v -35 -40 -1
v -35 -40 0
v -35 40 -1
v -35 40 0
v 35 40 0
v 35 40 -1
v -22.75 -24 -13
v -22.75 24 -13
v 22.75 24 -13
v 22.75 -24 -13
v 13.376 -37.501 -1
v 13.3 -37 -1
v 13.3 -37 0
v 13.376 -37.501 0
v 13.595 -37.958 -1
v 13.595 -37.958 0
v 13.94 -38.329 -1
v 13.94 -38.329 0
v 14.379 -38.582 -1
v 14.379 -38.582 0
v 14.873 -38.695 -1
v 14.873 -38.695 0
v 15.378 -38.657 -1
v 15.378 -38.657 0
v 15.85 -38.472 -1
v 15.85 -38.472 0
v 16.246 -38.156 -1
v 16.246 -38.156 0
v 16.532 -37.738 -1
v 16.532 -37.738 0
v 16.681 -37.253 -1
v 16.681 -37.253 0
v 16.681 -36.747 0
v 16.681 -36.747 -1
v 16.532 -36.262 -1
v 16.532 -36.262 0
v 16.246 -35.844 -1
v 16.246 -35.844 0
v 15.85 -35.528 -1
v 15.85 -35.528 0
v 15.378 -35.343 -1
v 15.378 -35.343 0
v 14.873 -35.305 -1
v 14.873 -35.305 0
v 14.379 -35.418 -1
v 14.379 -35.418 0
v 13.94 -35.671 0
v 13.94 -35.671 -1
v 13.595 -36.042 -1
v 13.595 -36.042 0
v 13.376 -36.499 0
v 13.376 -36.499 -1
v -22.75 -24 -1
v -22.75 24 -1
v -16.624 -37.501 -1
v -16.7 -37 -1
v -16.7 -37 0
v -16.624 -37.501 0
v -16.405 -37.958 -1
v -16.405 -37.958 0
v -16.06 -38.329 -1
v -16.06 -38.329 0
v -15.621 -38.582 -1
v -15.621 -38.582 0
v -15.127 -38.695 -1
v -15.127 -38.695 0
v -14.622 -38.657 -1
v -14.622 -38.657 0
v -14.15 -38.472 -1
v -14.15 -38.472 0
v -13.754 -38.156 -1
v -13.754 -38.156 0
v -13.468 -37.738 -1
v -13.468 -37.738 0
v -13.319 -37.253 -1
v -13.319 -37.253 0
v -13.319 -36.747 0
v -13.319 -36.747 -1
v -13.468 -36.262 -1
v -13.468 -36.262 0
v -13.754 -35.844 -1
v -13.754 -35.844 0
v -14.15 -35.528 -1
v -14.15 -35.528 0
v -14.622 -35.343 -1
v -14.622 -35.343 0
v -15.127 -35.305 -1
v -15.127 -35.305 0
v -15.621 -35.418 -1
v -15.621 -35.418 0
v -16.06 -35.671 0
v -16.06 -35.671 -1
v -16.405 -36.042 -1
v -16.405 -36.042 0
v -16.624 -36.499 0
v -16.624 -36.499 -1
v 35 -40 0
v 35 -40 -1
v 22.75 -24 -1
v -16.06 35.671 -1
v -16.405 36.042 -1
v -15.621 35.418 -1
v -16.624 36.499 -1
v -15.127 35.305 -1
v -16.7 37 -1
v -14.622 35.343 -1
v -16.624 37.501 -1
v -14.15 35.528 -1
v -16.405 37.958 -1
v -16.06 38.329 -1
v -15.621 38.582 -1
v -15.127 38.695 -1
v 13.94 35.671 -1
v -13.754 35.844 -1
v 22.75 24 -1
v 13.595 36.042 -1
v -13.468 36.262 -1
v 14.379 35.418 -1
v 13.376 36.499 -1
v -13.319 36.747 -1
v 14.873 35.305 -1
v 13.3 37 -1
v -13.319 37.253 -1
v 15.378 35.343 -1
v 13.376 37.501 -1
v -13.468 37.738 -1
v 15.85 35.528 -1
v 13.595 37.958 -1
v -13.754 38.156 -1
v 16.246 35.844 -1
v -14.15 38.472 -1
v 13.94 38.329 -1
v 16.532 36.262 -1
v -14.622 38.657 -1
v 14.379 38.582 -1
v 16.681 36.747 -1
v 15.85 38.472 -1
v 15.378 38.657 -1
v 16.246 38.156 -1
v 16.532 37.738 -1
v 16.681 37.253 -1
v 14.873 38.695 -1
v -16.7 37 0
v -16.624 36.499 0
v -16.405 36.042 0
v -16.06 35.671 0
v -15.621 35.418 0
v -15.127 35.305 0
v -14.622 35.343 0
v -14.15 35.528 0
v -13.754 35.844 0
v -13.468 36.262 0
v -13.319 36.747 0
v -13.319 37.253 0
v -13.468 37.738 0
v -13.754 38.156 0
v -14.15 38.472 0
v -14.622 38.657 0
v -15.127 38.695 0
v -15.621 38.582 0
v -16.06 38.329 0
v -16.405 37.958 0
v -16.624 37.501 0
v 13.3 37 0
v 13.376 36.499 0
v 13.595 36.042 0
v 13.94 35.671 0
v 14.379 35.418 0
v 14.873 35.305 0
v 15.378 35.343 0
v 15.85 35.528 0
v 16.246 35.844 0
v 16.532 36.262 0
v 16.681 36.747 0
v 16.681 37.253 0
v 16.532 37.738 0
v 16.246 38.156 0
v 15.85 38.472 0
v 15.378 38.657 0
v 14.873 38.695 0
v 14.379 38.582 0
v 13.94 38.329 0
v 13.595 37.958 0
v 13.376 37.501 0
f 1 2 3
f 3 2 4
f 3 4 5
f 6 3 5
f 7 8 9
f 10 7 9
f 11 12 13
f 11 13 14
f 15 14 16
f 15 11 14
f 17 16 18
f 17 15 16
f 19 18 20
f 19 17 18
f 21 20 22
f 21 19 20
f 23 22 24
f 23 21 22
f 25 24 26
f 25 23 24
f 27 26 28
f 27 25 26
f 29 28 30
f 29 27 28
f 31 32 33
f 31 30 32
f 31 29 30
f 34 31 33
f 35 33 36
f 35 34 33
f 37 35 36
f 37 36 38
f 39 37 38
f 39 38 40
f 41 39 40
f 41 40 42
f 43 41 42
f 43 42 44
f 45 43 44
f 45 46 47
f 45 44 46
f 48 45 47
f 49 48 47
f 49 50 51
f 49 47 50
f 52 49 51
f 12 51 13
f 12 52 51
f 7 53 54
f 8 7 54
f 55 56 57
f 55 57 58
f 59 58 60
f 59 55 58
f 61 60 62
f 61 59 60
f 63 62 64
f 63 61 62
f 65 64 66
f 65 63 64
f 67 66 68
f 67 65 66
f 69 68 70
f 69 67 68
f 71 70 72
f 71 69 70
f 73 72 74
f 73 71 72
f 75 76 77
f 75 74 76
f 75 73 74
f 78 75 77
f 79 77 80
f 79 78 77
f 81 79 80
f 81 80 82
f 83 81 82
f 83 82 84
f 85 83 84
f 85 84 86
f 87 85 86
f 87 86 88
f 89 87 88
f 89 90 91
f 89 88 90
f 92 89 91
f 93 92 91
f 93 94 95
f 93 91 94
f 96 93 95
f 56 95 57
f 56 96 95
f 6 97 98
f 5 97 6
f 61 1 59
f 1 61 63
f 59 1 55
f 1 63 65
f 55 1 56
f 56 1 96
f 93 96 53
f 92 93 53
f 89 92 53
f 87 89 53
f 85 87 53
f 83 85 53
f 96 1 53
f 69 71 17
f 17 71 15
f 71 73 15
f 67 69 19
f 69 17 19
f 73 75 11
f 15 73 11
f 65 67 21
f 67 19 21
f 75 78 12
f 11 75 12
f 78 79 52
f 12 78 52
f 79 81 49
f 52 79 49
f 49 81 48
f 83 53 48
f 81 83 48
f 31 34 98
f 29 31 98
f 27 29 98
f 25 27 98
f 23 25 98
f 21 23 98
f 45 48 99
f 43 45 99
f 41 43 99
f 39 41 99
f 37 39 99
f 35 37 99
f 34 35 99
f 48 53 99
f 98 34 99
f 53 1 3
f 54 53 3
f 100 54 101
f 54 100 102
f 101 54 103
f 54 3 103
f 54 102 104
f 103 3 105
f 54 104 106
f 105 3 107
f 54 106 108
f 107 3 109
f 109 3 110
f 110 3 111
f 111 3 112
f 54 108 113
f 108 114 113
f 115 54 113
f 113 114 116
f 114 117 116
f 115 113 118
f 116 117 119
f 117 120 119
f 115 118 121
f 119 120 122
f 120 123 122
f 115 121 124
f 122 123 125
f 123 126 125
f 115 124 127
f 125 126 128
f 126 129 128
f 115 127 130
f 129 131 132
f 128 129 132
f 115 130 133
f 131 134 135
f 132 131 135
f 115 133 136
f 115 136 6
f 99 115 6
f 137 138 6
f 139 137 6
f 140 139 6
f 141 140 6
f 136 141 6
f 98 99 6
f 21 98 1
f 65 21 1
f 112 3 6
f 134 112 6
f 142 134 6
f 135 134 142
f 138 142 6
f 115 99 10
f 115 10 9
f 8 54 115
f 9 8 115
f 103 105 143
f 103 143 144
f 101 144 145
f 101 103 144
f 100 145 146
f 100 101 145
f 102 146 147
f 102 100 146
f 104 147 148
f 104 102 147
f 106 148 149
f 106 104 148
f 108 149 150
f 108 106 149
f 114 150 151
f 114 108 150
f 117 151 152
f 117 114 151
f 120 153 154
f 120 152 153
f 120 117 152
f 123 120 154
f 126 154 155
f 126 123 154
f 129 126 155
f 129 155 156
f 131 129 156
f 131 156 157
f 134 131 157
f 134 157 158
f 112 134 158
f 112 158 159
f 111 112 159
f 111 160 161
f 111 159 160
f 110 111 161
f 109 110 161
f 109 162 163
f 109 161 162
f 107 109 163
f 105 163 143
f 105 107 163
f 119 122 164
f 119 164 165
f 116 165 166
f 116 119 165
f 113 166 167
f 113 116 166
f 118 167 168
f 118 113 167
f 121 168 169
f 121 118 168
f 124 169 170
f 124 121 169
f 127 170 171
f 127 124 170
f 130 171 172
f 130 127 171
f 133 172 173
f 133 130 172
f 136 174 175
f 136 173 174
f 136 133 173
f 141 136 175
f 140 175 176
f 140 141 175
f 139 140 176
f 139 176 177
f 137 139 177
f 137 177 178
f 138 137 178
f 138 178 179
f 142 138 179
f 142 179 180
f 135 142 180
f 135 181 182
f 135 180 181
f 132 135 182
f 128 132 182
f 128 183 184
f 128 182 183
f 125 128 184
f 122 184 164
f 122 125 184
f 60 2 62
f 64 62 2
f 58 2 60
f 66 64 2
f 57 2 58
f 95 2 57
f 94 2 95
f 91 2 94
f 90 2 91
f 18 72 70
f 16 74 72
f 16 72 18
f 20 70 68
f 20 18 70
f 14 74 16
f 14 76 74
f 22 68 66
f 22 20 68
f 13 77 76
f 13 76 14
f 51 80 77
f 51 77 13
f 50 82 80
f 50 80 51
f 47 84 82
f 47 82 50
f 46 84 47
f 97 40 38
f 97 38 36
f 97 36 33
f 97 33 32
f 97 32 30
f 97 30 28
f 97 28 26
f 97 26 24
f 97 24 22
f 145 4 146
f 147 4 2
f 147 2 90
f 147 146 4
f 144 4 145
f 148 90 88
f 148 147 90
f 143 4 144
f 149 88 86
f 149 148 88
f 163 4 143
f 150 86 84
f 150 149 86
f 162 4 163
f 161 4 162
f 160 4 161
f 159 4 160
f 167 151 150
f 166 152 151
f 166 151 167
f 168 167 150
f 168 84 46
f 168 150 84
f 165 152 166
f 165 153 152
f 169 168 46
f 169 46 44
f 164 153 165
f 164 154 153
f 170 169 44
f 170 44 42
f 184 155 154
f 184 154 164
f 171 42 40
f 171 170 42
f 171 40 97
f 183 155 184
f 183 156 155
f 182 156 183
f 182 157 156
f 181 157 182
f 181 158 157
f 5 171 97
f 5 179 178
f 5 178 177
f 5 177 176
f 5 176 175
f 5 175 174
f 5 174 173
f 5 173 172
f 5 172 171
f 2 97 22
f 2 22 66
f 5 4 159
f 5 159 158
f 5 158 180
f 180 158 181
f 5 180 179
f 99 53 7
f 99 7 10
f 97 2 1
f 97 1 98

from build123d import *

# Parameters (mm, degrees)
SKETCH1_W                   = 70
SKETCH1_H                   = 80
BOSS_EXTRUDE1_DEPTH         = 1
SKETCH2_W                   = 45.5
SKETCH2_H                   = 48
BOSS_EXTRUDE2_DEPTH         = 13
LO_M3_BAT_DRIVER_DEPTH      = 55.717456081
LO_M3_BAT_DRIVER_DEPTH_BACK = 55.717456081
SKETCH3_R                   = 1.7


with BuildPart() as part:
    # Sketch1 → Boss-Extrude1 (new body)
    with BuildSketch(Plane.XY):
        Rectangle(SKETCH1_W, SKETCH1_H)
    extrude(amount=-BOSS_EXTRUDE1_DEPTH)

    # Sketch2 → Boss-Extrude2 (add)
    with BuildSketch(Plane.XY):
        Rectangle(SKETCH2_W, SKETCH2_H)
    extrude(amount=-BOSS_EXTRUDE2_DEPTH)

    # Sketch3 → Lo_M3_bat_driver (cut, two sides: drawn at the far end of the back side and taken through both)
    with BuildSketch(Plane.XY.offset(-LO_M3_BAT_DRIVER_DEPTH_BACK)):
        with Locations(Location((-15, -37, 0), (0, 0, 180))):
            Circle(SKETCH3_R)
        with Locations(Location((-15, 37, 0), (0, 0, 180))):
            Circle(SKETCH3_R)
        with Locations(Location((15, -37, 0), (0, 0, 180))):
            Circle(SKETCH3_R)
        with Locations(Location((15, 37, 0), (0, 0, 180))):
            Circle(SKETCH3_R)
    extrude(amount=LO_M3_BAT_DRIVER_DEPTH + LO_M3_BAT_DRIVER_DEPTH_BACK, mode=Mode.SUBTRACT)


solid = part.part
